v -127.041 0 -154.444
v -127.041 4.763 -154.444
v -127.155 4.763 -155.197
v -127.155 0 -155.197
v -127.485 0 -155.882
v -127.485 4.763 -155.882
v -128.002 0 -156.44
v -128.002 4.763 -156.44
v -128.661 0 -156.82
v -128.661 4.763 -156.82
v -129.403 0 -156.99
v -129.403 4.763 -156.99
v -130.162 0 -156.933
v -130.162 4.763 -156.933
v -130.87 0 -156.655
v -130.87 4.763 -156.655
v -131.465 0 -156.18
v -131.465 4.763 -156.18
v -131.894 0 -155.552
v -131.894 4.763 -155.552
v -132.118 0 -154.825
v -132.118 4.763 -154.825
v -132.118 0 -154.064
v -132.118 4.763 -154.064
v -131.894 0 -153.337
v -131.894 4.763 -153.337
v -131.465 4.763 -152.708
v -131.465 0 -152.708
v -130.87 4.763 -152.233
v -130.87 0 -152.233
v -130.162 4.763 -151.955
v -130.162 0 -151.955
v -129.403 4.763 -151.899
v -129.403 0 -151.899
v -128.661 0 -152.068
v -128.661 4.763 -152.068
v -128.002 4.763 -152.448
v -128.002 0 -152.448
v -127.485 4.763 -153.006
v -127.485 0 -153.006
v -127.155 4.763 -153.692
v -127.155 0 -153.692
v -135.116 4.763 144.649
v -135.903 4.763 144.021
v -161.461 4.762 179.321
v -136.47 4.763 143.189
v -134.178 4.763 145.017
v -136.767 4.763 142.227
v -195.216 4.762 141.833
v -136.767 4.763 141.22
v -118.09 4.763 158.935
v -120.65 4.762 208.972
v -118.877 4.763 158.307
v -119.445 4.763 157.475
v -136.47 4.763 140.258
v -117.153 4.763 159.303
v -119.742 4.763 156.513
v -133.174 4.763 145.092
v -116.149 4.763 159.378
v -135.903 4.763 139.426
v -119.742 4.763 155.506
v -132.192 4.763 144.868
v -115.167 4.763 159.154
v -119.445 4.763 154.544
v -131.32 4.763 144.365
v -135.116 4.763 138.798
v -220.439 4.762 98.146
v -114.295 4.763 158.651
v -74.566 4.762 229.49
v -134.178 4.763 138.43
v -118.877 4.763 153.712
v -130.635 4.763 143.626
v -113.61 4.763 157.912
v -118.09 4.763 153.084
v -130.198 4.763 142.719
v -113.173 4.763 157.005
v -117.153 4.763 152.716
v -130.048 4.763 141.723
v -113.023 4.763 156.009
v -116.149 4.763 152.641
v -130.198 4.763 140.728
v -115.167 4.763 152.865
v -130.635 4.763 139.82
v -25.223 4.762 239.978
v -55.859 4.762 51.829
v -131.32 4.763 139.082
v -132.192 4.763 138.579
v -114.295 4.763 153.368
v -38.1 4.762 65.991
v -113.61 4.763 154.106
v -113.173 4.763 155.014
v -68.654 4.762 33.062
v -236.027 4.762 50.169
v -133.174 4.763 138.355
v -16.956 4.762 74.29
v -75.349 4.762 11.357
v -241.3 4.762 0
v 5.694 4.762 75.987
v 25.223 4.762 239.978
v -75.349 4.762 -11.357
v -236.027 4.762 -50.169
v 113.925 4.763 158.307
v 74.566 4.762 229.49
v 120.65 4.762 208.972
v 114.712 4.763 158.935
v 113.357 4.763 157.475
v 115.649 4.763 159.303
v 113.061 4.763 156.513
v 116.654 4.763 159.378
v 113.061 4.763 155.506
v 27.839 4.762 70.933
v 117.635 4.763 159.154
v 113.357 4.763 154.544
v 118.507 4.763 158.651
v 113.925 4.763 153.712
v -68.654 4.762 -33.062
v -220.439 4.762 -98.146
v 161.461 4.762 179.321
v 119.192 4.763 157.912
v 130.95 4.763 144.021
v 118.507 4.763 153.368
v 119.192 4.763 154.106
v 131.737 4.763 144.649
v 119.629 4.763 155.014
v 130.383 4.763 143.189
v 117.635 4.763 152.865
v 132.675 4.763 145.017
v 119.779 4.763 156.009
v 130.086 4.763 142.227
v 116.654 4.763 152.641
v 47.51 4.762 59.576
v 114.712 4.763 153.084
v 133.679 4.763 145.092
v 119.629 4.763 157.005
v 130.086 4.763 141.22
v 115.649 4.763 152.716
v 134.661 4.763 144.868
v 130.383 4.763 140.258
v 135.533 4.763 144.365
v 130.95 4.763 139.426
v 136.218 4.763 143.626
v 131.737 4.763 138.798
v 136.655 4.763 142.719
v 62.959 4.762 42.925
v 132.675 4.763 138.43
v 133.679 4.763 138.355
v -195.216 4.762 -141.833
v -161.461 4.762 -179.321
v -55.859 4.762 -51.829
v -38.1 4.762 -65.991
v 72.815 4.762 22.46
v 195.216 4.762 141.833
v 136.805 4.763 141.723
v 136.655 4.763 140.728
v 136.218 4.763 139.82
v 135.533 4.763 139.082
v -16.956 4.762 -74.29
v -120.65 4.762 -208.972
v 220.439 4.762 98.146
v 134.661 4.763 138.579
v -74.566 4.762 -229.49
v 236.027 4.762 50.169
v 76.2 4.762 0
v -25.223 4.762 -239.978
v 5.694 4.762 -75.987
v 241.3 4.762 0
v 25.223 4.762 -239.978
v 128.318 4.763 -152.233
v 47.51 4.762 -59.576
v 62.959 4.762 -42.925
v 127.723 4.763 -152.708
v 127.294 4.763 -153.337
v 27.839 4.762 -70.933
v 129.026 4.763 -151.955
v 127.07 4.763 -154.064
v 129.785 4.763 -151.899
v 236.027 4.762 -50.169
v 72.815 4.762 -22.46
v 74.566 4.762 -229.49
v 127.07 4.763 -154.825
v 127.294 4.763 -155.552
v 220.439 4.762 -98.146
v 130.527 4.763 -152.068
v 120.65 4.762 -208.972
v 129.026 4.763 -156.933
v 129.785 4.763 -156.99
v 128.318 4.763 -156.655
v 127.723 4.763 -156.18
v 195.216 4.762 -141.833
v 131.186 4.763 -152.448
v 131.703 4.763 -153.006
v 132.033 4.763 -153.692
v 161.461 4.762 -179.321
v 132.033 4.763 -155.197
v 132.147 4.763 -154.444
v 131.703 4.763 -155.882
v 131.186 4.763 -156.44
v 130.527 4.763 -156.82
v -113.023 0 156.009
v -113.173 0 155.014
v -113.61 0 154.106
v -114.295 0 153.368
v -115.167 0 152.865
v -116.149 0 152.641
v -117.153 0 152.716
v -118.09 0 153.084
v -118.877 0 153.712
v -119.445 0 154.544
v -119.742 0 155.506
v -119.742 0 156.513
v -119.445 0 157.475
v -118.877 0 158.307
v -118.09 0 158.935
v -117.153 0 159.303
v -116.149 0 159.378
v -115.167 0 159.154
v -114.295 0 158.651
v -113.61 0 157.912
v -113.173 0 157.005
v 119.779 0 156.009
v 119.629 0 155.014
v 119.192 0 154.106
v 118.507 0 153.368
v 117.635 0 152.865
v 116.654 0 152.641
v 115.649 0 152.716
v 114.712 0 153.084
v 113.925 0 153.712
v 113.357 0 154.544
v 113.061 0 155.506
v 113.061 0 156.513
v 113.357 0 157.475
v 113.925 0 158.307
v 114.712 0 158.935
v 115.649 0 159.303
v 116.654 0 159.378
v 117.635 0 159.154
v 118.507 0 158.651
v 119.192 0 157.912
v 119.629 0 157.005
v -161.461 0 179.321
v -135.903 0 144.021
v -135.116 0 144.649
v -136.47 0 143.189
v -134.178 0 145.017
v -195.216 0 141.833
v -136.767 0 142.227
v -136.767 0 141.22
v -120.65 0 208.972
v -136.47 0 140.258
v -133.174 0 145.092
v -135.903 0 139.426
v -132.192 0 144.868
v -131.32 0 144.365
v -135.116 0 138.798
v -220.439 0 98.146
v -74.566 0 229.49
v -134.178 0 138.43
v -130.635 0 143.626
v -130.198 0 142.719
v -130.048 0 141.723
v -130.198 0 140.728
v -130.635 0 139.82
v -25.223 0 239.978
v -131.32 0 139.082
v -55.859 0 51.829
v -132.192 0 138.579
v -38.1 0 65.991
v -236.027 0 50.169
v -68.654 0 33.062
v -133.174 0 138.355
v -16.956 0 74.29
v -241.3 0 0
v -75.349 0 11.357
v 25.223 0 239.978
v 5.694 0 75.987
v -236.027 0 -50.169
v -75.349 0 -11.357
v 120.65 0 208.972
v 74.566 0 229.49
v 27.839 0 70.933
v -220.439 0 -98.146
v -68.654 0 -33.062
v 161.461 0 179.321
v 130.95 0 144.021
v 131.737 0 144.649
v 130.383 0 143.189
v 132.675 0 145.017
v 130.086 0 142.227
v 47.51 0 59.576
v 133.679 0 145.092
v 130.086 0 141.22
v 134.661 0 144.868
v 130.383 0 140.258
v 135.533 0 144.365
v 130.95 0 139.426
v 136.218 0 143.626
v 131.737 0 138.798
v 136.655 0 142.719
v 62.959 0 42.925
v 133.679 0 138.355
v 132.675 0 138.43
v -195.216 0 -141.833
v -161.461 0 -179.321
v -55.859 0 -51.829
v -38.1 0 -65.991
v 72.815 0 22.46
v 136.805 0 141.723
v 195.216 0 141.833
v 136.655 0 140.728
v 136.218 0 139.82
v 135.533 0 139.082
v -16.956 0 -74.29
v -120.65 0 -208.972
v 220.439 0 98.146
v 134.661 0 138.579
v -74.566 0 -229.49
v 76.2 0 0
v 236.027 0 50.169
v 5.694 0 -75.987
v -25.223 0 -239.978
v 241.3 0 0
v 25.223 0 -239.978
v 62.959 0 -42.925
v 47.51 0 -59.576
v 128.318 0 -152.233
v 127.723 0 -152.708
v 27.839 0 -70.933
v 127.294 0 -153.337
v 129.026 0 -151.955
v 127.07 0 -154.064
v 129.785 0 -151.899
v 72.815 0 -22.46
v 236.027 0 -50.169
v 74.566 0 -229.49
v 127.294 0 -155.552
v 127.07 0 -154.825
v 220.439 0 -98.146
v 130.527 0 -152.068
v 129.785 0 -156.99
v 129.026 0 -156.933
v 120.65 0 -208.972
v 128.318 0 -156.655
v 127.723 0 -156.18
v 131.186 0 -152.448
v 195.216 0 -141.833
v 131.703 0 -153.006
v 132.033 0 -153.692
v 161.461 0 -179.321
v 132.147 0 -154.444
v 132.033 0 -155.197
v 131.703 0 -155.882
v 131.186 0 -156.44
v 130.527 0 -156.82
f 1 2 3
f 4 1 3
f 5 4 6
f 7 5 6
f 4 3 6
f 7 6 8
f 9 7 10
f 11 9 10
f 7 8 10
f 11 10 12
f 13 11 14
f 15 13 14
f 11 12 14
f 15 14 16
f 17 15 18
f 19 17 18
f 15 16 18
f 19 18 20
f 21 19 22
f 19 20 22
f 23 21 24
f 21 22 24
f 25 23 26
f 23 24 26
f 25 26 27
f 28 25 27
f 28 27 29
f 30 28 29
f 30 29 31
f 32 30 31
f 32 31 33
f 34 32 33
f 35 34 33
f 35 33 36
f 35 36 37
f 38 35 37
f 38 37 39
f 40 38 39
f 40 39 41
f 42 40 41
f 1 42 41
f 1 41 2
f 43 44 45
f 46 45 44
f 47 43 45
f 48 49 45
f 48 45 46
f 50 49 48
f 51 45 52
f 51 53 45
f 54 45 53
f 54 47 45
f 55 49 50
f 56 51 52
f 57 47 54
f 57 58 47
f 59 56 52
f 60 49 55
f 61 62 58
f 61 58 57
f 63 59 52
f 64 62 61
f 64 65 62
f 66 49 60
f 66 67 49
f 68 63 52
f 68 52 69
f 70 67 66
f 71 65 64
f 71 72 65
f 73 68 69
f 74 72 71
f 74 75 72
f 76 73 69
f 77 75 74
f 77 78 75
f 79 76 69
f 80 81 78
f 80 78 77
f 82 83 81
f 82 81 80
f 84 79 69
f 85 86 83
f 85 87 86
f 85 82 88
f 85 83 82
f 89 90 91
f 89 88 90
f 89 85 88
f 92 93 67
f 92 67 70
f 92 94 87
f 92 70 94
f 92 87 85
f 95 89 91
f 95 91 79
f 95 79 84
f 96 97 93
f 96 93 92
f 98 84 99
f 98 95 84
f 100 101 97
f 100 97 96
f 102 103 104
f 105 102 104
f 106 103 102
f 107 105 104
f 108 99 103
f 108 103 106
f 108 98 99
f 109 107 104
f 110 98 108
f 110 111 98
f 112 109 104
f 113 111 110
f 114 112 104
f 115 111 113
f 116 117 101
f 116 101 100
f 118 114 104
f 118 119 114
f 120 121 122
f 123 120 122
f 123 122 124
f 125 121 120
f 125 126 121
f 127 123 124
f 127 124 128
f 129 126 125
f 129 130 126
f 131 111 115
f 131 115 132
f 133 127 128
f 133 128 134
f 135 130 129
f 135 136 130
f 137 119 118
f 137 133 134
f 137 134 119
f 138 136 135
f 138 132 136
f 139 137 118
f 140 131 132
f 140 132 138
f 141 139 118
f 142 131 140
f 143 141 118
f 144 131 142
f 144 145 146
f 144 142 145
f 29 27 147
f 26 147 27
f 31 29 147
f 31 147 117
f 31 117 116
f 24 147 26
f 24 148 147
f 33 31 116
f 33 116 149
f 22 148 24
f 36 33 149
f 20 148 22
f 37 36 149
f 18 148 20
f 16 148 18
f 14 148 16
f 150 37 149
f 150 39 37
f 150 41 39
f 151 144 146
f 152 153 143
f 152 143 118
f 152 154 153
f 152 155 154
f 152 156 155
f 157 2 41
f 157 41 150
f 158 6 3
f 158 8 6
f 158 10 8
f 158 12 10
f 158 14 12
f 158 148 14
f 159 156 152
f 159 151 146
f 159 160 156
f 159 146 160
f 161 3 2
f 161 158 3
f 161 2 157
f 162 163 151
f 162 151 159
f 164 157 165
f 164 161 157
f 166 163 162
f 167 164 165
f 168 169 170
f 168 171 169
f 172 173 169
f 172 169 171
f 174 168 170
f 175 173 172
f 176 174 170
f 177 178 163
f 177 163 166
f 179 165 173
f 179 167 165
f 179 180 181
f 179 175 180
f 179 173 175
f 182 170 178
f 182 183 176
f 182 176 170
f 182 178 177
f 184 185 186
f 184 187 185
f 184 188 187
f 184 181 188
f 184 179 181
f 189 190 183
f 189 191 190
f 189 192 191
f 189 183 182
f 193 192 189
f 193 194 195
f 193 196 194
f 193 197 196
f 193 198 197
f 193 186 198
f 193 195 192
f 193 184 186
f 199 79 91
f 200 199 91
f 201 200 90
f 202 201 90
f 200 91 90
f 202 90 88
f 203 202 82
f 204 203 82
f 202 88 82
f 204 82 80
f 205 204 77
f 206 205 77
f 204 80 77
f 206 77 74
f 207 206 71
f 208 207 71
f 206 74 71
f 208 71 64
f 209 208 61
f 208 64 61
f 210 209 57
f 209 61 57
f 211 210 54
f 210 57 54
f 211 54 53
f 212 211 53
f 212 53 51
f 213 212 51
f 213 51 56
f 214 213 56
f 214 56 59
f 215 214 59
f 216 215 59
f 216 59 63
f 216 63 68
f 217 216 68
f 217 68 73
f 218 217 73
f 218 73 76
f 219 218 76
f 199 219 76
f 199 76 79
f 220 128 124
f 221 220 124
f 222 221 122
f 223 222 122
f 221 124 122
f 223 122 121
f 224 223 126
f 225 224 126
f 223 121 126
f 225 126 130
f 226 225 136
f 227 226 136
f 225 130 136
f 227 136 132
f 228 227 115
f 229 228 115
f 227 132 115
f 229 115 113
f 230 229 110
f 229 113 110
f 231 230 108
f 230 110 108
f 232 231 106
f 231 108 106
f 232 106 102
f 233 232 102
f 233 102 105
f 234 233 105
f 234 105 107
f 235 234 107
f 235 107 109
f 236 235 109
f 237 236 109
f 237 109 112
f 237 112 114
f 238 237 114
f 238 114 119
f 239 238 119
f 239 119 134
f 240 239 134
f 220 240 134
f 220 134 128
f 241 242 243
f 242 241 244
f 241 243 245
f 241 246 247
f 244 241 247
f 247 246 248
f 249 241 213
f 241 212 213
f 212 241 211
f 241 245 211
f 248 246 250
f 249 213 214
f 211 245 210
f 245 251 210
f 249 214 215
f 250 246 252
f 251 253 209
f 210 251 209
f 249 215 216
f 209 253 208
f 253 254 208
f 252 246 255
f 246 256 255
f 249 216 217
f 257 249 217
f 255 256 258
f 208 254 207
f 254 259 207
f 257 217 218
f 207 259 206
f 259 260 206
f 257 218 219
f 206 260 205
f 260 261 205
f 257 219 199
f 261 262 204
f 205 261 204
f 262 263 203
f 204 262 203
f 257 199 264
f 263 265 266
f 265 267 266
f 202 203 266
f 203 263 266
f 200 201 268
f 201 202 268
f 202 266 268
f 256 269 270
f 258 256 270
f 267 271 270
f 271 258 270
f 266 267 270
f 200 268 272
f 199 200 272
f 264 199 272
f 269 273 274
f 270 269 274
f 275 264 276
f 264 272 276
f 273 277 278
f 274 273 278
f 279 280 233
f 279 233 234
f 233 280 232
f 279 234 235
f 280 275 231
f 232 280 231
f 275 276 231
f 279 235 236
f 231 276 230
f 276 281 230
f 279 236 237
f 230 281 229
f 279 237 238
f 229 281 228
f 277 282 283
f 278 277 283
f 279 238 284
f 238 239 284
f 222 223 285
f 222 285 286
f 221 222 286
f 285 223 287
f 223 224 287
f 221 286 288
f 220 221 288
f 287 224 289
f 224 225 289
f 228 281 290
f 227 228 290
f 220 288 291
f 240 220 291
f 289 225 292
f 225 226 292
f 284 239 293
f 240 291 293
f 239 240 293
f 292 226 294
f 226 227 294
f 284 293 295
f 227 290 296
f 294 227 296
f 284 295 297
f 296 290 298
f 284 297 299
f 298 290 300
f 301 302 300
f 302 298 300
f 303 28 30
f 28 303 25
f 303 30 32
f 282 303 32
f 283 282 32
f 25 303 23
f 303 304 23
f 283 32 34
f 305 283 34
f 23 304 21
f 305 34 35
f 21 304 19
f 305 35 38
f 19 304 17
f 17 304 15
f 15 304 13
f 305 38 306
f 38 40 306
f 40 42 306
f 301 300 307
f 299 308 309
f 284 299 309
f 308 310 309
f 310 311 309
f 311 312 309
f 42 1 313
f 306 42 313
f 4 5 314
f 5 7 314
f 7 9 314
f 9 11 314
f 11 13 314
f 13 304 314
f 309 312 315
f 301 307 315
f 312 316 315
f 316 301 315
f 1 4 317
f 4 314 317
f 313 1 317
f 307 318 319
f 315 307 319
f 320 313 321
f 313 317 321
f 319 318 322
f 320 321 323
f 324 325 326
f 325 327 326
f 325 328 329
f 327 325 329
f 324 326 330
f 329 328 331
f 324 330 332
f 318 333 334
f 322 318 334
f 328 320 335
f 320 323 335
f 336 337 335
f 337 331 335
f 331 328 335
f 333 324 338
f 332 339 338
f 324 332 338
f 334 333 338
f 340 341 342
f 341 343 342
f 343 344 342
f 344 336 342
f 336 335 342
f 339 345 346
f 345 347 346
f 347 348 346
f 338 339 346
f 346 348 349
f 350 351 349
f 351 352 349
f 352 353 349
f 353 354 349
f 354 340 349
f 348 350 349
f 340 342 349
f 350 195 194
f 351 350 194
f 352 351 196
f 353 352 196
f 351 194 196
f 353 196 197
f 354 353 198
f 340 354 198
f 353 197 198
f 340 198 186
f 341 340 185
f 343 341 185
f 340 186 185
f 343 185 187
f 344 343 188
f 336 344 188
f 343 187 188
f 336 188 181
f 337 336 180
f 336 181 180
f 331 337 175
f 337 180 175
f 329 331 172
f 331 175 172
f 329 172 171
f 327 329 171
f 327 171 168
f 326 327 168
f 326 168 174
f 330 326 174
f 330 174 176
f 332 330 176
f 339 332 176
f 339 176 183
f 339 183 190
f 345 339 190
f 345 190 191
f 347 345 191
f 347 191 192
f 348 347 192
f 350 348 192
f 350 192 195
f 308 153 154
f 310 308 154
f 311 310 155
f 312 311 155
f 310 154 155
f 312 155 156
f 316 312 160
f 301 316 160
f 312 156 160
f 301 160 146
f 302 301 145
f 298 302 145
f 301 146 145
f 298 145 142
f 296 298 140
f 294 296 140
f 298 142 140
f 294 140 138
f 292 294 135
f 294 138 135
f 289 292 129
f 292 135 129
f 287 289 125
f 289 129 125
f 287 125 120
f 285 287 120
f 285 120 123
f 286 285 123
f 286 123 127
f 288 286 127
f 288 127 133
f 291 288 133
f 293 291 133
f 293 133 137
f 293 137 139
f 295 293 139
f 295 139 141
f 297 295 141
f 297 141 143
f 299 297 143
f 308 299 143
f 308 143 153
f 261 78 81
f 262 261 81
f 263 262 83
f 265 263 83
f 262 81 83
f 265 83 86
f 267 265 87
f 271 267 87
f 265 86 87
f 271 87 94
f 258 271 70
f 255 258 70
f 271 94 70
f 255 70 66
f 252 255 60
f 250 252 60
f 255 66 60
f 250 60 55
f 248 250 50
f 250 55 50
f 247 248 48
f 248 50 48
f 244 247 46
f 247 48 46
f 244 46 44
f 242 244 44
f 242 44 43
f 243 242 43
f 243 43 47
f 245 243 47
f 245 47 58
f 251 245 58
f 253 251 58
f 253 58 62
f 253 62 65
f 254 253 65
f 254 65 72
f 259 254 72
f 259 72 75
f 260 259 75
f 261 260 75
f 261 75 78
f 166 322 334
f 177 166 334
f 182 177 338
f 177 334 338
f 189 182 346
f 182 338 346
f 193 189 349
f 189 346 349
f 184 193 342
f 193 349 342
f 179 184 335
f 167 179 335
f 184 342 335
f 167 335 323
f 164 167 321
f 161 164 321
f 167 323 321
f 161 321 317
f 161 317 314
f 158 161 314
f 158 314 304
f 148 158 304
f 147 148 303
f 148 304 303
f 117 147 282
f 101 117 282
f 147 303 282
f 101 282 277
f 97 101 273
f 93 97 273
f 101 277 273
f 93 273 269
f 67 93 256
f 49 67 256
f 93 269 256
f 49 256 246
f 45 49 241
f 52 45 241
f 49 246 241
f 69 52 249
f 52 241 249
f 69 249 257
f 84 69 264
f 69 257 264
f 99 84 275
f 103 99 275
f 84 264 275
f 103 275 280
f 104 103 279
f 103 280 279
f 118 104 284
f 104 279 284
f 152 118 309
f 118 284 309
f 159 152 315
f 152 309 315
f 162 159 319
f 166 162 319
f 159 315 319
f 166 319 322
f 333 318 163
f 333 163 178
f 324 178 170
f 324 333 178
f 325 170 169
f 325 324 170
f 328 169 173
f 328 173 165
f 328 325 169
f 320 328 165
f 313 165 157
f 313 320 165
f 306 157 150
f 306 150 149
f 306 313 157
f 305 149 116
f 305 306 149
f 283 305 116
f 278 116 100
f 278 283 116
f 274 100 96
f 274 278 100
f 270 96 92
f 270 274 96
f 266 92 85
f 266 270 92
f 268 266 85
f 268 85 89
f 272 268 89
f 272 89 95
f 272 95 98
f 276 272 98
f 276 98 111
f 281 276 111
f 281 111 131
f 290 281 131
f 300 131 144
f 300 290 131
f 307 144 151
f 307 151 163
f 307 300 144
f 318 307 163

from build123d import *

# Parameters (mm, degrees)
SKETCH1_R               = 241.3
SKETCH1_R_2             = 76.2
BOSS_EXTRUDE1_DEPTH     = 4.7625
F_1_4_CLEARANCE_HOLE1_D = 6.7564
F_10_CLEARANCE_HOLE1_D  = 5.1054


with BuildPart() as part:
    # Sketch1 → Boss-Extrude1 (new body)
    with BuildSketch(Plane(origin=(0, 0, 0), x_dir=(1, 0, 0), z_dir=(0, 1, 0))):
        Circle(SKETCH1_R)
        Circle(SKETCH1_R_2, mode=Mode.SUBTRACT)
    extrude(amount=BOSS_EXTRUDE1_DEPTH)

    # 1/4 Clearance Hole1 (through all)
    with Locations(Plane(origin=(0, 0, 0), x_dir=(-1, 0, 0), z_dir=(0, -1, 0))):
        with Locations((133.426417095, -141.723430894), (-133.426417095, -141.723430894), (-116.401079347, -156.009385519), (116.401079347, -156.009385519)):
            Hole(F_1_4_CLEARANCE_HOLE1_D / 2)

    # #10 Clearance Hole1 (through all)
    with Locations(Plane(origin=(0, 0, 0), x_dir=(-1, 0, 0), z_dir=(0, -1, 0))):
        with Locations((-129.594016958, 154.444135288), (129.594016958, 154.444135288)):
            Hole(F_10_CLEARANCE_HOLE1_D / 2)


solid = part.part
